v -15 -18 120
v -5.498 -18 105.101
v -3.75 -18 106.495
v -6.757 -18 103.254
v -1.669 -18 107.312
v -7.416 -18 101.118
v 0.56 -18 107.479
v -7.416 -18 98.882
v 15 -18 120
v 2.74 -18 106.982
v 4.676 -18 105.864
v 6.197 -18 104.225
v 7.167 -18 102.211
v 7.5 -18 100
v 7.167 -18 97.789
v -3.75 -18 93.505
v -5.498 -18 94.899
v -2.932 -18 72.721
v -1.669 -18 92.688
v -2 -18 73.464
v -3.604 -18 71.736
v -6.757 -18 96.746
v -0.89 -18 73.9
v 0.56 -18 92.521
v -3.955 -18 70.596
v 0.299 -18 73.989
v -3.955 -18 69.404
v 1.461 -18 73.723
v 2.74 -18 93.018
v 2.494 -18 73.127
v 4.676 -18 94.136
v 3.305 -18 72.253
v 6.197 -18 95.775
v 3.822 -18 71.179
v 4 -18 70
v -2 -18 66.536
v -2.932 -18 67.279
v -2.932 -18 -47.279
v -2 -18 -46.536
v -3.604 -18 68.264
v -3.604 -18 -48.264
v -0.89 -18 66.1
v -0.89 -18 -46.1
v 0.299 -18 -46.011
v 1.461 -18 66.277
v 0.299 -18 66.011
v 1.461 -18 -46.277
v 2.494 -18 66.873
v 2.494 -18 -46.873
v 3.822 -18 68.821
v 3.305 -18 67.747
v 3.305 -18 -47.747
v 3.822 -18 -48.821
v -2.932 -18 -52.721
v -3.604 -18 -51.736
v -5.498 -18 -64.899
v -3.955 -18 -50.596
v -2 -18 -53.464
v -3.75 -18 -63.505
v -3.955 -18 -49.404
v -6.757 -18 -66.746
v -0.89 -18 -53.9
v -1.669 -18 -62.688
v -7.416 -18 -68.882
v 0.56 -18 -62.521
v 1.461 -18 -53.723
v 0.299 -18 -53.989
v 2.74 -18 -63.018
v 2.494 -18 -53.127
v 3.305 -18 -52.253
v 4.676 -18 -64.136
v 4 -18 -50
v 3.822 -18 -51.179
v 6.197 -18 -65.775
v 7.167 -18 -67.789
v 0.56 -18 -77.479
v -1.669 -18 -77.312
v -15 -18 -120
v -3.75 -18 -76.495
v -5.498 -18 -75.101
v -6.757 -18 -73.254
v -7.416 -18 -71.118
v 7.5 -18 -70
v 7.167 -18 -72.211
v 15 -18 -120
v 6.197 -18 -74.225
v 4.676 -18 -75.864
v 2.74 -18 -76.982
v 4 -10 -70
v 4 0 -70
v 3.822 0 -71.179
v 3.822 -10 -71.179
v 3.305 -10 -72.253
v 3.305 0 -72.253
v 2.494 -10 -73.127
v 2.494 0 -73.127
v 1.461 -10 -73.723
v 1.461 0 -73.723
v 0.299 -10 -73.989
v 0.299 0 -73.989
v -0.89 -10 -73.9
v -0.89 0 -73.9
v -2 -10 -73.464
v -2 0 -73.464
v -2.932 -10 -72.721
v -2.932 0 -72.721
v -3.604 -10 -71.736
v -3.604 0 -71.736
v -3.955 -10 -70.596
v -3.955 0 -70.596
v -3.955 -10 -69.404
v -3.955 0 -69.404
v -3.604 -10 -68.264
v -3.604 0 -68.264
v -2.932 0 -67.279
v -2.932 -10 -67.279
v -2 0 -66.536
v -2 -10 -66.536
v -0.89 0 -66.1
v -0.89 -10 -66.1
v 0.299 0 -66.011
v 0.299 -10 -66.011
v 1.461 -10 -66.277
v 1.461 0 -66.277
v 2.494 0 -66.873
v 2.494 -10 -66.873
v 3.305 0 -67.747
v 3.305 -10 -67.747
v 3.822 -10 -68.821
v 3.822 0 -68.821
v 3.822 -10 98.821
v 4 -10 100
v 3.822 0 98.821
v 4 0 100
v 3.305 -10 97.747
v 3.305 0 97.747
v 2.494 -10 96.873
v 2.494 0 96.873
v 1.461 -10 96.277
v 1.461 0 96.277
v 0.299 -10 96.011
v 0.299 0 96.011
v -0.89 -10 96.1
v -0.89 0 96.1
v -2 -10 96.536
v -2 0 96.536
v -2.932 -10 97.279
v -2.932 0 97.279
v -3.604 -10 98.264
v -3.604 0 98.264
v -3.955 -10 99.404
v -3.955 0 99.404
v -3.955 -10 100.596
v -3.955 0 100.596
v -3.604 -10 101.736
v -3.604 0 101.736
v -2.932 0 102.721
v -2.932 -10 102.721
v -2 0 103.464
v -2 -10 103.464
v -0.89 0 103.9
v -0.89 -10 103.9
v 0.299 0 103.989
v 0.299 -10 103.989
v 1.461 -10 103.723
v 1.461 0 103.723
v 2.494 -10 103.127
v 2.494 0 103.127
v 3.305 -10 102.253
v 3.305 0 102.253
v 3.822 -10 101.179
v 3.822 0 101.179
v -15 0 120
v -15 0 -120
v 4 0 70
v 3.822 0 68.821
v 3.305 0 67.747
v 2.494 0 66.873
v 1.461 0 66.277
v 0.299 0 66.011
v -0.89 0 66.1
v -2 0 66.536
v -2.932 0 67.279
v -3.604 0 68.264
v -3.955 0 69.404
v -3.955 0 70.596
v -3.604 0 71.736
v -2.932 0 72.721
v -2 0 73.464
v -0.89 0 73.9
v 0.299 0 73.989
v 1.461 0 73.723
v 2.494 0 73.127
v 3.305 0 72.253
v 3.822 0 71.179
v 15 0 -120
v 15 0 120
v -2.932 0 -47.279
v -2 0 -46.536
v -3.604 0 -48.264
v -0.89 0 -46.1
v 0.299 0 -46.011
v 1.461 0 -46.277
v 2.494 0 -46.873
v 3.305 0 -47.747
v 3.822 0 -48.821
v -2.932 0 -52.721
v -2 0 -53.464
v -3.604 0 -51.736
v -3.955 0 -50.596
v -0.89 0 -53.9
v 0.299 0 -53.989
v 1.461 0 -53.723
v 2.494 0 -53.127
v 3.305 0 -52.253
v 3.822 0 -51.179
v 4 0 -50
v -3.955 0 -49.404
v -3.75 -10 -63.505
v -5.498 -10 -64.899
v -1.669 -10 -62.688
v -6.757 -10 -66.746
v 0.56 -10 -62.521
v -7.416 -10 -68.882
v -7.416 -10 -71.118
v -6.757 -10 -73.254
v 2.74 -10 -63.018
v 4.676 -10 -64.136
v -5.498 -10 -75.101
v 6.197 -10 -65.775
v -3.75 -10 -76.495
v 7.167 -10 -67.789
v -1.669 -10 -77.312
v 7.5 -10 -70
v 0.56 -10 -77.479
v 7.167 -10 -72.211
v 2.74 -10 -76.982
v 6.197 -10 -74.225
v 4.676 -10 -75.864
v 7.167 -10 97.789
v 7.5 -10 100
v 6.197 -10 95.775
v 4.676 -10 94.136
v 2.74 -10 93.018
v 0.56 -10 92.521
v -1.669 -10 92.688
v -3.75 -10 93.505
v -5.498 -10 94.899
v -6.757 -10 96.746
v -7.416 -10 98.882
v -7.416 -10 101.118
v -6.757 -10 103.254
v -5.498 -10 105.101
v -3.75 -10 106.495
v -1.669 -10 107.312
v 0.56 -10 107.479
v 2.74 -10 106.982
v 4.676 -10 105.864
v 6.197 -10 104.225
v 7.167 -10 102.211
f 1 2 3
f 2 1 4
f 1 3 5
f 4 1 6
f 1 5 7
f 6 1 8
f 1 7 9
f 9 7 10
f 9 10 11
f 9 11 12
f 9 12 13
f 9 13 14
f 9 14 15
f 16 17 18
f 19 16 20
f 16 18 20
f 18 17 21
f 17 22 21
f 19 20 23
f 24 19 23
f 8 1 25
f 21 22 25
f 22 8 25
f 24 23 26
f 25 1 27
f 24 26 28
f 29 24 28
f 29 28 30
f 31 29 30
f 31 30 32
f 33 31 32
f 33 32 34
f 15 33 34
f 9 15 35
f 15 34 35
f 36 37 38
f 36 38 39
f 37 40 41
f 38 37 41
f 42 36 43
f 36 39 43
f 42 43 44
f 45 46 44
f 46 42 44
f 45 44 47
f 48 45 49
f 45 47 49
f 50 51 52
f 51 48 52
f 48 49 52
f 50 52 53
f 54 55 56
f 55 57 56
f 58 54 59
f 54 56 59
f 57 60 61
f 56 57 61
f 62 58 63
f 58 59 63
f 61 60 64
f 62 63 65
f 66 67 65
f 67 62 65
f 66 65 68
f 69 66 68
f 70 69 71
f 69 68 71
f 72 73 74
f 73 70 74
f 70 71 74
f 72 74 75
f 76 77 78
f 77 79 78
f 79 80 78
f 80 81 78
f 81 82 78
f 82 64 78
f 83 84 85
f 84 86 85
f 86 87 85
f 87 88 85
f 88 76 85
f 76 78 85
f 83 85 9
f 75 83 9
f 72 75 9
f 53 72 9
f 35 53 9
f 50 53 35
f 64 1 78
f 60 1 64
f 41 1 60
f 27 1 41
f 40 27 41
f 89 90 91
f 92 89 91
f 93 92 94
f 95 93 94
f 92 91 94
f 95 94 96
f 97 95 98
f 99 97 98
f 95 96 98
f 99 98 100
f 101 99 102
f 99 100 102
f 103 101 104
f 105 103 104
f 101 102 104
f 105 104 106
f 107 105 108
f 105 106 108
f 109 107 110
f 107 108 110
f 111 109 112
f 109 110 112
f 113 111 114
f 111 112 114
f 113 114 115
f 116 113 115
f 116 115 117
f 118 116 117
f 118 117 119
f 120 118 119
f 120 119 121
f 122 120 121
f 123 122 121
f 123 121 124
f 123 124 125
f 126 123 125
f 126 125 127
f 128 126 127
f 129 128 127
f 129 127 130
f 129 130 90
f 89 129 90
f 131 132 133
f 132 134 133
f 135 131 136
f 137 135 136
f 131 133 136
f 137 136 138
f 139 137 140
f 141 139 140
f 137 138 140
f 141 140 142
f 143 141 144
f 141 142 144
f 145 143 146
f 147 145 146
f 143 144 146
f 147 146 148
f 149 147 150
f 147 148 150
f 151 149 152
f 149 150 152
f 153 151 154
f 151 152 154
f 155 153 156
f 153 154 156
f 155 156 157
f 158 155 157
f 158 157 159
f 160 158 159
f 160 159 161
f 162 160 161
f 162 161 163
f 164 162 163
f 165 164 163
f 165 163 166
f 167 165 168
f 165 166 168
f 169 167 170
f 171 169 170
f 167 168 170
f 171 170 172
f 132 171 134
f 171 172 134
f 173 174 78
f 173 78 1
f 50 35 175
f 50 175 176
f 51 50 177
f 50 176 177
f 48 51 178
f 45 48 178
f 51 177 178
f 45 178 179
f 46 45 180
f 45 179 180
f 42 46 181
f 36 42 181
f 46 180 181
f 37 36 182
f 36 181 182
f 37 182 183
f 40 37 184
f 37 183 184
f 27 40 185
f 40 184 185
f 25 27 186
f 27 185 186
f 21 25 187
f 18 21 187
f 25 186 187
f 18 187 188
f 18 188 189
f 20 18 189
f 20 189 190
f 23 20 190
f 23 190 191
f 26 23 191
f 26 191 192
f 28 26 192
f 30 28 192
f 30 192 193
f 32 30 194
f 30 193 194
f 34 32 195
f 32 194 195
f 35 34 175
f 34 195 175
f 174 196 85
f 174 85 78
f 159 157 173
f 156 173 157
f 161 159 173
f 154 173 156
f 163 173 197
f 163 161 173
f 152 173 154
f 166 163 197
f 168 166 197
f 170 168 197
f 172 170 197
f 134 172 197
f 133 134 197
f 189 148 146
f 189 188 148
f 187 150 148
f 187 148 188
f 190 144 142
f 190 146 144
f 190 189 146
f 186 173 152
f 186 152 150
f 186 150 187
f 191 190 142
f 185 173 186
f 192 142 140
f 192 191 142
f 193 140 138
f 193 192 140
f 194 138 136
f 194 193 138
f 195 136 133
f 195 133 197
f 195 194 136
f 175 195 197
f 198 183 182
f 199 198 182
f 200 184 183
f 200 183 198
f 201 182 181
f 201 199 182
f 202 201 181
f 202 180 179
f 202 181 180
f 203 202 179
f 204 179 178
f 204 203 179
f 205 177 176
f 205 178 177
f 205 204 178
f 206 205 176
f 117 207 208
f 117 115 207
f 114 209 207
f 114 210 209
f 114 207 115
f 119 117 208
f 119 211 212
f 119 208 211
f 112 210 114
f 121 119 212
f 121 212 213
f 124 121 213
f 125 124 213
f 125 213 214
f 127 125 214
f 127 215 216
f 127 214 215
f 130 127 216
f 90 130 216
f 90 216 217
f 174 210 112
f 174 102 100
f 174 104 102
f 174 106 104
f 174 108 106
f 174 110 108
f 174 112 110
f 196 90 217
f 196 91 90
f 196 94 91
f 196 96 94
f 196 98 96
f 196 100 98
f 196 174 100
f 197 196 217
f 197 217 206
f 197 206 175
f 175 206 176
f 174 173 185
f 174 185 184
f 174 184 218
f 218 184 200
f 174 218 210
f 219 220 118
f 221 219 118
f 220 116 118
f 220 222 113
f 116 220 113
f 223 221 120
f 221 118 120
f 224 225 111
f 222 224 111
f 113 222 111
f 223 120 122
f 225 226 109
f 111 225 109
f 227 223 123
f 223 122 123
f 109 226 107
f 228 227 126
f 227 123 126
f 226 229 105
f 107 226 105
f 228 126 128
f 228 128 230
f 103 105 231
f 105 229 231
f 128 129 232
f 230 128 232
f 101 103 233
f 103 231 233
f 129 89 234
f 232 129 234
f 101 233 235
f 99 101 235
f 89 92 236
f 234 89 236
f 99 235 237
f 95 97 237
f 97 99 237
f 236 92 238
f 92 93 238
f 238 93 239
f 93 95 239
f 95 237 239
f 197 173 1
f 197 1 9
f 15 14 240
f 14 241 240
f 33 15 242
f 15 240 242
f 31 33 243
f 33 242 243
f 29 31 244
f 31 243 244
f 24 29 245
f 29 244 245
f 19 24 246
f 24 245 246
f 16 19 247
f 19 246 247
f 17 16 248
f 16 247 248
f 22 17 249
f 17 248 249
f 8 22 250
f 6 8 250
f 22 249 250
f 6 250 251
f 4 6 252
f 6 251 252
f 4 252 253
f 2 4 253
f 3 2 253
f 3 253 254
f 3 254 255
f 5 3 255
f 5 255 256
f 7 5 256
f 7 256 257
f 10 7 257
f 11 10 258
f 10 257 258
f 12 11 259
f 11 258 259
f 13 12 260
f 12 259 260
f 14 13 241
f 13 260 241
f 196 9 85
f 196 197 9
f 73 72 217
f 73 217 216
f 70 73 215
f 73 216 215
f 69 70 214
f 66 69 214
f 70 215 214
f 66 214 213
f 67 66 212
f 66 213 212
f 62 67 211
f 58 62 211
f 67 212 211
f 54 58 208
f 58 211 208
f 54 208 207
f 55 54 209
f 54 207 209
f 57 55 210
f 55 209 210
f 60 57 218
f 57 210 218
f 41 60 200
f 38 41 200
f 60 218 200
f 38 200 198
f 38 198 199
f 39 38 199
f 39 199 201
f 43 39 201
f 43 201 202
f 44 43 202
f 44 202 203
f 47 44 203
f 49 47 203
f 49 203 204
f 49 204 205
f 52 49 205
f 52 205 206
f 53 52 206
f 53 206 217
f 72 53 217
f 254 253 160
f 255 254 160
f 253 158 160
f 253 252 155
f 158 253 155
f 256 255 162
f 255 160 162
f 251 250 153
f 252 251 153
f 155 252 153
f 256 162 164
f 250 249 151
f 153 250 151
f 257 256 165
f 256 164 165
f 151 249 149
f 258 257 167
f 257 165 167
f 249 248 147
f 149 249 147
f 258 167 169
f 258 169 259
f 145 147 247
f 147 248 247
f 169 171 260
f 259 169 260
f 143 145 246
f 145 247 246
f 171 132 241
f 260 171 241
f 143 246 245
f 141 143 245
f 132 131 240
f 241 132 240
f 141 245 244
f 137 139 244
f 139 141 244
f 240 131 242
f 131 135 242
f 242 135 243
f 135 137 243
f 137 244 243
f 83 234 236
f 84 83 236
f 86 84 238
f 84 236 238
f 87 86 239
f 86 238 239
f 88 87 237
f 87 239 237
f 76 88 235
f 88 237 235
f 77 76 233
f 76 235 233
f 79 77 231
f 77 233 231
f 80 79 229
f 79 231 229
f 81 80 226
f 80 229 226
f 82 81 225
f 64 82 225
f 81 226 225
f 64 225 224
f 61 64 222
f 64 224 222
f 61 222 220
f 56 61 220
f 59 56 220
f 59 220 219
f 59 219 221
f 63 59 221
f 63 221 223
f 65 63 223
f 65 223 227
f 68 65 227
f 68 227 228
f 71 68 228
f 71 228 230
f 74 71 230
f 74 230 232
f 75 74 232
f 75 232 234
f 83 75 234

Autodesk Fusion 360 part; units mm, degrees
sketch "Front" plane through (0, 0, 0) normal (0, 1, 0) x (1, 0, 0)
  line L0 (-15, -120) -> (15, -120)
  line L1 (15, -120) -> (15, 120)
  line L2 (15, 120) -> (-15, 120)
  line L3 (-15, 120) -> (-15, -120)
  line L4 (0, -120) -> (0, 120) construction
  circle A0 centre (0, -100) radius 4
  circle A1 centre (0, -70) radius 4
  circle A2 centre (0, 50) radius 4
  circle A3 centre (0, 70) radius 4
  circle A4 centre (0, -100) radius 7.5
  circle A5 centre (0, 70) radius 7.5
  dimension "d1" = 240
  dimension "d2" = 30
  dimension "d3" = 8
  dimension "d4" = 8
  dimension "d5" = 8
  dimension "d6" = 8
  dimension "d7" = 50
  dimension "d8" = 20
  dimension "d9" = 30
  dimension "d10" = 20
  dimension "d15" = 15
  dimension "d16" = 15
extrude "Extrude3" add sketch "Front" against normal blind 10 contours A4 | A5 makes body 1 at (7.4907, -6.6667, 100.3738) makes body 2 at (7.4907, -6.6667, -69.6262)
extrude "Extrude4" add sketch "Front" against normal blind 18 contours L0 L1 L2 L3 bodies 1 2
